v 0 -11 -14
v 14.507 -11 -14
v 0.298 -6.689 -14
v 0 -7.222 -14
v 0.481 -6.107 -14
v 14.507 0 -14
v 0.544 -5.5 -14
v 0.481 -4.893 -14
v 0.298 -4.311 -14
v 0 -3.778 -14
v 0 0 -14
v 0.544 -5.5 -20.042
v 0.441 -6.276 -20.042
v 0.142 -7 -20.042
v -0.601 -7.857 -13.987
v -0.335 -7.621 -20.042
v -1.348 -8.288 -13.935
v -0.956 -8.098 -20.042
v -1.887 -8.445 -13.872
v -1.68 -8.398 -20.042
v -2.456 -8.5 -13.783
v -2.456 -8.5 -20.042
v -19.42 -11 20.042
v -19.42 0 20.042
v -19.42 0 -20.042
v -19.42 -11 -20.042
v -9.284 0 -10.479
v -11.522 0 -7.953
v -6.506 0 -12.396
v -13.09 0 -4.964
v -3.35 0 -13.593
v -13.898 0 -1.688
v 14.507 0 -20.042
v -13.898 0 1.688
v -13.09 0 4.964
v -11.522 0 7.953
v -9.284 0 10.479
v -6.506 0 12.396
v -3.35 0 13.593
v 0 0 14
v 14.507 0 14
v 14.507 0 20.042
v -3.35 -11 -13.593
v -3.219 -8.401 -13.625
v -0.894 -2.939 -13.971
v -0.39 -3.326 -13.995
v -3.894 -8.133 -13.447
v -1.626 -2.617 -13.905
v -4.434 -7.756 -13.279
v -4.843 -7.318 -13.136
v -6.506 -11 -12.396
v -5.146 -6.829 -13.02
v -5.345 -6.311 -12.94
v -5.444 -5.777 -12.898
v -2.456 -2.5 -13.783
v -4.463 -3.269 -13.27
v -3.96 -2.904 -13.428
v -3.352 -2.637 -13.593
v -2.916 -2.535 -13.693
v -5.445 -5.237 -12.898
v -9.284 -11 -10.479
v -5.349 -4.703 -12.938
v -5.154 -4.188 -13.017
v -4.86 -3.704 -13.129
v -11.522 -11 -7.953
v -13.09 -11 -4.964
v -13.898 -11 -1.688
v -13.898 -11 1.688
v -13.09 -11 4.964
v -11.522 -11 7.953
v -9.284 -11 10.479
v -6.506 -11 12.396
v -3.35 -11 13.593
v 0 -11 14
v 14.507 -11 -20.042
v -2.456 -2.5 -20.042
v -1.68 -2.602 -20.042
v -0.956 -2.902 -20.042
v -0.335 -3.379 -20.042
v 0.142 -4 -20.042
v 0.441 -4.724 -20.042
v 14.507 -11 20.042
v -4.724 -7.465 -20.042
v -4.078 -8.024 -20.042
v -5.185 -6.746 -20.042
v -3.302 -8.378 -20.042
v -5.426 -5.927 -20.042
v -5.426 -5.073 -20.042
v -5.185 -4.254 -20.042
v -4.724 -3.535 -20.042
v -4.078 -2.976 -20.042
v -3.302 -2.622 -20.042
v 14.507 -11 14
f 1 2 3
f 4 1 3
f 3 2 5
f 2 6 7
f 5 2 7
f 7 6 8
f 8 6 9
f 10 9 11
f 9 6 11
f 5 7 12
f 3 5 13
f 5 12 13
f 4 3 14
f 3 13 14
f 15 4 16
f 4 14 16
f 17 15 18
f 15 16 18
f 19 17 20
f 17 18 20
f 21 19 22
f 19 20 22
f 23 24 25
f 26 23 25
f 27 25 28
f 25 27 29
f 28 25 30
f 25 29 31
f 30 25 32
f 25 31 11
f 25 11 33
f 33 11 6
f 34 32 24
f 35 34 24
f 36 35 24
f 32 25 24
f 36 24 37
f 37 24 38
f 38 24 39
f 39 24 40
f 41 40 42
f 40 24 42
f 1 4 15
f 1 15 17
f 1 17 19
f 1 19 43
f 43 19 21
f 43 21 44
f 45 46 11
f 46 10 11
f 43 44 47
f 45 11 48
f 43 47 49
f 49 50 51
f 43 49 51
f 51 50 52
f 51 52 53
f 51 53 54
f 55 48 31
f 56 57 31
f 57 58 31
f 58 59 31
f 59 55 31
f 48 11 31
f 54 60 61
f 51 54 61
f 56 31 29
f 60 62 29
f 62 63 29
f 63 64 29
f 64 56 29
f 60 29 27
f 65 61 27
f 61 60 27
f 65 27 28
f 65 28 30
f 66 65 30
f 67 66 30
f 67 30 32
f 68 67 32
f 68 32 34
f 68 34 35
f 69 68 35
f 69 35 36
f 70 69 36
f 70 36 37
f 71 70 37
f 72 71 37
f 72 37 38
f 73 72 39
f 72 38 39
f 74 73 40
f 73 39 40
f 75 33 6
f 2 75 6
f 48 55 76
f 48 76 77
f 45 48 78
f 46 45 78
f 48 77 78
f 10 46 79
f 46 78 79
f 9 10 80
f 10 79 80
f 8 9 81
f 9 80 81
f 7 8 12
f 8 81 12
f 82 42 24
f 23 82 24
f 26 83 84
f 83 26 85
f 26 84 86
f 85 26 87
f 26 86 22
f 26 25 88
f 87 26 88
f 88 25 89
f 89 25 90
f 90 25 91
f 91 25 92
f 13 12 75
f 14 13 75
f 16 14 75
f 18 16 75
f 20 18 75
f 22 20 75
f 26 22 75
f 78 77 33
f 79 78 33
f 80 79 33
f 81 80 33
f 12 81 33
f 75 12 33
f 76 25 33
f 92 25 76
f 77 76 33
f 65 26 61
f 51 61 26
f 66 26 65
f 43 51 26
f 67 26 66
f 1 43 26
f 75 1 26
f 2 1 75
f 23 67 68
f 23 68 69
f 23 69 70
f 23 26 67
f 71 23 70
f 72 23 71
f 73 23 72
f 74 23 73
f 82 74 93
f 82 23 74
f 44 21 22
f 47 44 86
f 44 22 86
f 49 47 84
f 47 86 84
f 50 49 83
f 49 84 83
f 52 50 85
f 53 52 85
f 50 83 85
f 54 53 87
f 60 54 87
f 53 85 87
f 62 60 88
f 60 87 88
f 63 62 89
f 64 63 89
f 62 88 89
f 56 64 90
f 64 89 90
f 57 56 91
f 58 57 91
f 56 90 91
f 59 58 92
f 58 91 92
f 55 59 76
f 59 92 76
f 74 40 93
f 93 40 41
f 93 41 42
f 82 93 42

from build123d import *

# Parameters (mm, degrees)
F2_DEPTH = 11
F4_DEPTH = 7.1505523714


with BuildPart() as f2:
    # F1 (on Front) → F2 (new body)
    with BuildSketch(Plane.XZ):
        with BuildLine():
            Line((14.506585896, 14), (14.506585896, 20.0424585491))
            Line((14.506585896, 20.0424585491), (-19.4195080549, 20.0424585491))
            Line((-19.4195080549, 20.0424585491), (-19.4195080549, -20.0424585491))
            Line((-19.4195080549, -20.0424585491), (14.506585896, -20.0424585491))
            Line((14.506585896, -20.0424585491), (14.506585896, -14))
            Line((14.506585896, -14), (0, -14))
            ThreePointArc((0, -14), (-14, 0), (0, 14))
            Line((0, 14), (14.506585896, 14))
        make_face()
    extrude(amount=F2_DEPTH)

    # F3 (on face) → F4 (cut, through all)
    with BuildSketch(Plane(origin=(0, 0, -20.0424585491), x_dir=(1, 0, 0), z_dir=(0, 0, -1))):
        with BuildLine():
            Line((-2.4564610794, 8.5), (-2.4564610794, 2.5))
            ThreePointArc((-2.4564610794, 2.5), (-0.3351407359, 3.3786796564), (0.5435389206, 5.5))
            ThreePointArc((0.5435389206, 5.5), (-0.3351407359, 7.6213203436), (-2.4564610794, 8.5))
        make_face()
        with BuildLine():
            ThreePointArc((-2.4564610794, 8.5), (-5.4564610794, 5.5), (-2.4564610794, 2.5))
            Line((-2.4564610794, 2.5), (-2.4564610794, 8.5))
        make_face()
    extrude(amount=-F4_DEPTH, mode=Mode.SUBTRACT)


solid = f2.part
